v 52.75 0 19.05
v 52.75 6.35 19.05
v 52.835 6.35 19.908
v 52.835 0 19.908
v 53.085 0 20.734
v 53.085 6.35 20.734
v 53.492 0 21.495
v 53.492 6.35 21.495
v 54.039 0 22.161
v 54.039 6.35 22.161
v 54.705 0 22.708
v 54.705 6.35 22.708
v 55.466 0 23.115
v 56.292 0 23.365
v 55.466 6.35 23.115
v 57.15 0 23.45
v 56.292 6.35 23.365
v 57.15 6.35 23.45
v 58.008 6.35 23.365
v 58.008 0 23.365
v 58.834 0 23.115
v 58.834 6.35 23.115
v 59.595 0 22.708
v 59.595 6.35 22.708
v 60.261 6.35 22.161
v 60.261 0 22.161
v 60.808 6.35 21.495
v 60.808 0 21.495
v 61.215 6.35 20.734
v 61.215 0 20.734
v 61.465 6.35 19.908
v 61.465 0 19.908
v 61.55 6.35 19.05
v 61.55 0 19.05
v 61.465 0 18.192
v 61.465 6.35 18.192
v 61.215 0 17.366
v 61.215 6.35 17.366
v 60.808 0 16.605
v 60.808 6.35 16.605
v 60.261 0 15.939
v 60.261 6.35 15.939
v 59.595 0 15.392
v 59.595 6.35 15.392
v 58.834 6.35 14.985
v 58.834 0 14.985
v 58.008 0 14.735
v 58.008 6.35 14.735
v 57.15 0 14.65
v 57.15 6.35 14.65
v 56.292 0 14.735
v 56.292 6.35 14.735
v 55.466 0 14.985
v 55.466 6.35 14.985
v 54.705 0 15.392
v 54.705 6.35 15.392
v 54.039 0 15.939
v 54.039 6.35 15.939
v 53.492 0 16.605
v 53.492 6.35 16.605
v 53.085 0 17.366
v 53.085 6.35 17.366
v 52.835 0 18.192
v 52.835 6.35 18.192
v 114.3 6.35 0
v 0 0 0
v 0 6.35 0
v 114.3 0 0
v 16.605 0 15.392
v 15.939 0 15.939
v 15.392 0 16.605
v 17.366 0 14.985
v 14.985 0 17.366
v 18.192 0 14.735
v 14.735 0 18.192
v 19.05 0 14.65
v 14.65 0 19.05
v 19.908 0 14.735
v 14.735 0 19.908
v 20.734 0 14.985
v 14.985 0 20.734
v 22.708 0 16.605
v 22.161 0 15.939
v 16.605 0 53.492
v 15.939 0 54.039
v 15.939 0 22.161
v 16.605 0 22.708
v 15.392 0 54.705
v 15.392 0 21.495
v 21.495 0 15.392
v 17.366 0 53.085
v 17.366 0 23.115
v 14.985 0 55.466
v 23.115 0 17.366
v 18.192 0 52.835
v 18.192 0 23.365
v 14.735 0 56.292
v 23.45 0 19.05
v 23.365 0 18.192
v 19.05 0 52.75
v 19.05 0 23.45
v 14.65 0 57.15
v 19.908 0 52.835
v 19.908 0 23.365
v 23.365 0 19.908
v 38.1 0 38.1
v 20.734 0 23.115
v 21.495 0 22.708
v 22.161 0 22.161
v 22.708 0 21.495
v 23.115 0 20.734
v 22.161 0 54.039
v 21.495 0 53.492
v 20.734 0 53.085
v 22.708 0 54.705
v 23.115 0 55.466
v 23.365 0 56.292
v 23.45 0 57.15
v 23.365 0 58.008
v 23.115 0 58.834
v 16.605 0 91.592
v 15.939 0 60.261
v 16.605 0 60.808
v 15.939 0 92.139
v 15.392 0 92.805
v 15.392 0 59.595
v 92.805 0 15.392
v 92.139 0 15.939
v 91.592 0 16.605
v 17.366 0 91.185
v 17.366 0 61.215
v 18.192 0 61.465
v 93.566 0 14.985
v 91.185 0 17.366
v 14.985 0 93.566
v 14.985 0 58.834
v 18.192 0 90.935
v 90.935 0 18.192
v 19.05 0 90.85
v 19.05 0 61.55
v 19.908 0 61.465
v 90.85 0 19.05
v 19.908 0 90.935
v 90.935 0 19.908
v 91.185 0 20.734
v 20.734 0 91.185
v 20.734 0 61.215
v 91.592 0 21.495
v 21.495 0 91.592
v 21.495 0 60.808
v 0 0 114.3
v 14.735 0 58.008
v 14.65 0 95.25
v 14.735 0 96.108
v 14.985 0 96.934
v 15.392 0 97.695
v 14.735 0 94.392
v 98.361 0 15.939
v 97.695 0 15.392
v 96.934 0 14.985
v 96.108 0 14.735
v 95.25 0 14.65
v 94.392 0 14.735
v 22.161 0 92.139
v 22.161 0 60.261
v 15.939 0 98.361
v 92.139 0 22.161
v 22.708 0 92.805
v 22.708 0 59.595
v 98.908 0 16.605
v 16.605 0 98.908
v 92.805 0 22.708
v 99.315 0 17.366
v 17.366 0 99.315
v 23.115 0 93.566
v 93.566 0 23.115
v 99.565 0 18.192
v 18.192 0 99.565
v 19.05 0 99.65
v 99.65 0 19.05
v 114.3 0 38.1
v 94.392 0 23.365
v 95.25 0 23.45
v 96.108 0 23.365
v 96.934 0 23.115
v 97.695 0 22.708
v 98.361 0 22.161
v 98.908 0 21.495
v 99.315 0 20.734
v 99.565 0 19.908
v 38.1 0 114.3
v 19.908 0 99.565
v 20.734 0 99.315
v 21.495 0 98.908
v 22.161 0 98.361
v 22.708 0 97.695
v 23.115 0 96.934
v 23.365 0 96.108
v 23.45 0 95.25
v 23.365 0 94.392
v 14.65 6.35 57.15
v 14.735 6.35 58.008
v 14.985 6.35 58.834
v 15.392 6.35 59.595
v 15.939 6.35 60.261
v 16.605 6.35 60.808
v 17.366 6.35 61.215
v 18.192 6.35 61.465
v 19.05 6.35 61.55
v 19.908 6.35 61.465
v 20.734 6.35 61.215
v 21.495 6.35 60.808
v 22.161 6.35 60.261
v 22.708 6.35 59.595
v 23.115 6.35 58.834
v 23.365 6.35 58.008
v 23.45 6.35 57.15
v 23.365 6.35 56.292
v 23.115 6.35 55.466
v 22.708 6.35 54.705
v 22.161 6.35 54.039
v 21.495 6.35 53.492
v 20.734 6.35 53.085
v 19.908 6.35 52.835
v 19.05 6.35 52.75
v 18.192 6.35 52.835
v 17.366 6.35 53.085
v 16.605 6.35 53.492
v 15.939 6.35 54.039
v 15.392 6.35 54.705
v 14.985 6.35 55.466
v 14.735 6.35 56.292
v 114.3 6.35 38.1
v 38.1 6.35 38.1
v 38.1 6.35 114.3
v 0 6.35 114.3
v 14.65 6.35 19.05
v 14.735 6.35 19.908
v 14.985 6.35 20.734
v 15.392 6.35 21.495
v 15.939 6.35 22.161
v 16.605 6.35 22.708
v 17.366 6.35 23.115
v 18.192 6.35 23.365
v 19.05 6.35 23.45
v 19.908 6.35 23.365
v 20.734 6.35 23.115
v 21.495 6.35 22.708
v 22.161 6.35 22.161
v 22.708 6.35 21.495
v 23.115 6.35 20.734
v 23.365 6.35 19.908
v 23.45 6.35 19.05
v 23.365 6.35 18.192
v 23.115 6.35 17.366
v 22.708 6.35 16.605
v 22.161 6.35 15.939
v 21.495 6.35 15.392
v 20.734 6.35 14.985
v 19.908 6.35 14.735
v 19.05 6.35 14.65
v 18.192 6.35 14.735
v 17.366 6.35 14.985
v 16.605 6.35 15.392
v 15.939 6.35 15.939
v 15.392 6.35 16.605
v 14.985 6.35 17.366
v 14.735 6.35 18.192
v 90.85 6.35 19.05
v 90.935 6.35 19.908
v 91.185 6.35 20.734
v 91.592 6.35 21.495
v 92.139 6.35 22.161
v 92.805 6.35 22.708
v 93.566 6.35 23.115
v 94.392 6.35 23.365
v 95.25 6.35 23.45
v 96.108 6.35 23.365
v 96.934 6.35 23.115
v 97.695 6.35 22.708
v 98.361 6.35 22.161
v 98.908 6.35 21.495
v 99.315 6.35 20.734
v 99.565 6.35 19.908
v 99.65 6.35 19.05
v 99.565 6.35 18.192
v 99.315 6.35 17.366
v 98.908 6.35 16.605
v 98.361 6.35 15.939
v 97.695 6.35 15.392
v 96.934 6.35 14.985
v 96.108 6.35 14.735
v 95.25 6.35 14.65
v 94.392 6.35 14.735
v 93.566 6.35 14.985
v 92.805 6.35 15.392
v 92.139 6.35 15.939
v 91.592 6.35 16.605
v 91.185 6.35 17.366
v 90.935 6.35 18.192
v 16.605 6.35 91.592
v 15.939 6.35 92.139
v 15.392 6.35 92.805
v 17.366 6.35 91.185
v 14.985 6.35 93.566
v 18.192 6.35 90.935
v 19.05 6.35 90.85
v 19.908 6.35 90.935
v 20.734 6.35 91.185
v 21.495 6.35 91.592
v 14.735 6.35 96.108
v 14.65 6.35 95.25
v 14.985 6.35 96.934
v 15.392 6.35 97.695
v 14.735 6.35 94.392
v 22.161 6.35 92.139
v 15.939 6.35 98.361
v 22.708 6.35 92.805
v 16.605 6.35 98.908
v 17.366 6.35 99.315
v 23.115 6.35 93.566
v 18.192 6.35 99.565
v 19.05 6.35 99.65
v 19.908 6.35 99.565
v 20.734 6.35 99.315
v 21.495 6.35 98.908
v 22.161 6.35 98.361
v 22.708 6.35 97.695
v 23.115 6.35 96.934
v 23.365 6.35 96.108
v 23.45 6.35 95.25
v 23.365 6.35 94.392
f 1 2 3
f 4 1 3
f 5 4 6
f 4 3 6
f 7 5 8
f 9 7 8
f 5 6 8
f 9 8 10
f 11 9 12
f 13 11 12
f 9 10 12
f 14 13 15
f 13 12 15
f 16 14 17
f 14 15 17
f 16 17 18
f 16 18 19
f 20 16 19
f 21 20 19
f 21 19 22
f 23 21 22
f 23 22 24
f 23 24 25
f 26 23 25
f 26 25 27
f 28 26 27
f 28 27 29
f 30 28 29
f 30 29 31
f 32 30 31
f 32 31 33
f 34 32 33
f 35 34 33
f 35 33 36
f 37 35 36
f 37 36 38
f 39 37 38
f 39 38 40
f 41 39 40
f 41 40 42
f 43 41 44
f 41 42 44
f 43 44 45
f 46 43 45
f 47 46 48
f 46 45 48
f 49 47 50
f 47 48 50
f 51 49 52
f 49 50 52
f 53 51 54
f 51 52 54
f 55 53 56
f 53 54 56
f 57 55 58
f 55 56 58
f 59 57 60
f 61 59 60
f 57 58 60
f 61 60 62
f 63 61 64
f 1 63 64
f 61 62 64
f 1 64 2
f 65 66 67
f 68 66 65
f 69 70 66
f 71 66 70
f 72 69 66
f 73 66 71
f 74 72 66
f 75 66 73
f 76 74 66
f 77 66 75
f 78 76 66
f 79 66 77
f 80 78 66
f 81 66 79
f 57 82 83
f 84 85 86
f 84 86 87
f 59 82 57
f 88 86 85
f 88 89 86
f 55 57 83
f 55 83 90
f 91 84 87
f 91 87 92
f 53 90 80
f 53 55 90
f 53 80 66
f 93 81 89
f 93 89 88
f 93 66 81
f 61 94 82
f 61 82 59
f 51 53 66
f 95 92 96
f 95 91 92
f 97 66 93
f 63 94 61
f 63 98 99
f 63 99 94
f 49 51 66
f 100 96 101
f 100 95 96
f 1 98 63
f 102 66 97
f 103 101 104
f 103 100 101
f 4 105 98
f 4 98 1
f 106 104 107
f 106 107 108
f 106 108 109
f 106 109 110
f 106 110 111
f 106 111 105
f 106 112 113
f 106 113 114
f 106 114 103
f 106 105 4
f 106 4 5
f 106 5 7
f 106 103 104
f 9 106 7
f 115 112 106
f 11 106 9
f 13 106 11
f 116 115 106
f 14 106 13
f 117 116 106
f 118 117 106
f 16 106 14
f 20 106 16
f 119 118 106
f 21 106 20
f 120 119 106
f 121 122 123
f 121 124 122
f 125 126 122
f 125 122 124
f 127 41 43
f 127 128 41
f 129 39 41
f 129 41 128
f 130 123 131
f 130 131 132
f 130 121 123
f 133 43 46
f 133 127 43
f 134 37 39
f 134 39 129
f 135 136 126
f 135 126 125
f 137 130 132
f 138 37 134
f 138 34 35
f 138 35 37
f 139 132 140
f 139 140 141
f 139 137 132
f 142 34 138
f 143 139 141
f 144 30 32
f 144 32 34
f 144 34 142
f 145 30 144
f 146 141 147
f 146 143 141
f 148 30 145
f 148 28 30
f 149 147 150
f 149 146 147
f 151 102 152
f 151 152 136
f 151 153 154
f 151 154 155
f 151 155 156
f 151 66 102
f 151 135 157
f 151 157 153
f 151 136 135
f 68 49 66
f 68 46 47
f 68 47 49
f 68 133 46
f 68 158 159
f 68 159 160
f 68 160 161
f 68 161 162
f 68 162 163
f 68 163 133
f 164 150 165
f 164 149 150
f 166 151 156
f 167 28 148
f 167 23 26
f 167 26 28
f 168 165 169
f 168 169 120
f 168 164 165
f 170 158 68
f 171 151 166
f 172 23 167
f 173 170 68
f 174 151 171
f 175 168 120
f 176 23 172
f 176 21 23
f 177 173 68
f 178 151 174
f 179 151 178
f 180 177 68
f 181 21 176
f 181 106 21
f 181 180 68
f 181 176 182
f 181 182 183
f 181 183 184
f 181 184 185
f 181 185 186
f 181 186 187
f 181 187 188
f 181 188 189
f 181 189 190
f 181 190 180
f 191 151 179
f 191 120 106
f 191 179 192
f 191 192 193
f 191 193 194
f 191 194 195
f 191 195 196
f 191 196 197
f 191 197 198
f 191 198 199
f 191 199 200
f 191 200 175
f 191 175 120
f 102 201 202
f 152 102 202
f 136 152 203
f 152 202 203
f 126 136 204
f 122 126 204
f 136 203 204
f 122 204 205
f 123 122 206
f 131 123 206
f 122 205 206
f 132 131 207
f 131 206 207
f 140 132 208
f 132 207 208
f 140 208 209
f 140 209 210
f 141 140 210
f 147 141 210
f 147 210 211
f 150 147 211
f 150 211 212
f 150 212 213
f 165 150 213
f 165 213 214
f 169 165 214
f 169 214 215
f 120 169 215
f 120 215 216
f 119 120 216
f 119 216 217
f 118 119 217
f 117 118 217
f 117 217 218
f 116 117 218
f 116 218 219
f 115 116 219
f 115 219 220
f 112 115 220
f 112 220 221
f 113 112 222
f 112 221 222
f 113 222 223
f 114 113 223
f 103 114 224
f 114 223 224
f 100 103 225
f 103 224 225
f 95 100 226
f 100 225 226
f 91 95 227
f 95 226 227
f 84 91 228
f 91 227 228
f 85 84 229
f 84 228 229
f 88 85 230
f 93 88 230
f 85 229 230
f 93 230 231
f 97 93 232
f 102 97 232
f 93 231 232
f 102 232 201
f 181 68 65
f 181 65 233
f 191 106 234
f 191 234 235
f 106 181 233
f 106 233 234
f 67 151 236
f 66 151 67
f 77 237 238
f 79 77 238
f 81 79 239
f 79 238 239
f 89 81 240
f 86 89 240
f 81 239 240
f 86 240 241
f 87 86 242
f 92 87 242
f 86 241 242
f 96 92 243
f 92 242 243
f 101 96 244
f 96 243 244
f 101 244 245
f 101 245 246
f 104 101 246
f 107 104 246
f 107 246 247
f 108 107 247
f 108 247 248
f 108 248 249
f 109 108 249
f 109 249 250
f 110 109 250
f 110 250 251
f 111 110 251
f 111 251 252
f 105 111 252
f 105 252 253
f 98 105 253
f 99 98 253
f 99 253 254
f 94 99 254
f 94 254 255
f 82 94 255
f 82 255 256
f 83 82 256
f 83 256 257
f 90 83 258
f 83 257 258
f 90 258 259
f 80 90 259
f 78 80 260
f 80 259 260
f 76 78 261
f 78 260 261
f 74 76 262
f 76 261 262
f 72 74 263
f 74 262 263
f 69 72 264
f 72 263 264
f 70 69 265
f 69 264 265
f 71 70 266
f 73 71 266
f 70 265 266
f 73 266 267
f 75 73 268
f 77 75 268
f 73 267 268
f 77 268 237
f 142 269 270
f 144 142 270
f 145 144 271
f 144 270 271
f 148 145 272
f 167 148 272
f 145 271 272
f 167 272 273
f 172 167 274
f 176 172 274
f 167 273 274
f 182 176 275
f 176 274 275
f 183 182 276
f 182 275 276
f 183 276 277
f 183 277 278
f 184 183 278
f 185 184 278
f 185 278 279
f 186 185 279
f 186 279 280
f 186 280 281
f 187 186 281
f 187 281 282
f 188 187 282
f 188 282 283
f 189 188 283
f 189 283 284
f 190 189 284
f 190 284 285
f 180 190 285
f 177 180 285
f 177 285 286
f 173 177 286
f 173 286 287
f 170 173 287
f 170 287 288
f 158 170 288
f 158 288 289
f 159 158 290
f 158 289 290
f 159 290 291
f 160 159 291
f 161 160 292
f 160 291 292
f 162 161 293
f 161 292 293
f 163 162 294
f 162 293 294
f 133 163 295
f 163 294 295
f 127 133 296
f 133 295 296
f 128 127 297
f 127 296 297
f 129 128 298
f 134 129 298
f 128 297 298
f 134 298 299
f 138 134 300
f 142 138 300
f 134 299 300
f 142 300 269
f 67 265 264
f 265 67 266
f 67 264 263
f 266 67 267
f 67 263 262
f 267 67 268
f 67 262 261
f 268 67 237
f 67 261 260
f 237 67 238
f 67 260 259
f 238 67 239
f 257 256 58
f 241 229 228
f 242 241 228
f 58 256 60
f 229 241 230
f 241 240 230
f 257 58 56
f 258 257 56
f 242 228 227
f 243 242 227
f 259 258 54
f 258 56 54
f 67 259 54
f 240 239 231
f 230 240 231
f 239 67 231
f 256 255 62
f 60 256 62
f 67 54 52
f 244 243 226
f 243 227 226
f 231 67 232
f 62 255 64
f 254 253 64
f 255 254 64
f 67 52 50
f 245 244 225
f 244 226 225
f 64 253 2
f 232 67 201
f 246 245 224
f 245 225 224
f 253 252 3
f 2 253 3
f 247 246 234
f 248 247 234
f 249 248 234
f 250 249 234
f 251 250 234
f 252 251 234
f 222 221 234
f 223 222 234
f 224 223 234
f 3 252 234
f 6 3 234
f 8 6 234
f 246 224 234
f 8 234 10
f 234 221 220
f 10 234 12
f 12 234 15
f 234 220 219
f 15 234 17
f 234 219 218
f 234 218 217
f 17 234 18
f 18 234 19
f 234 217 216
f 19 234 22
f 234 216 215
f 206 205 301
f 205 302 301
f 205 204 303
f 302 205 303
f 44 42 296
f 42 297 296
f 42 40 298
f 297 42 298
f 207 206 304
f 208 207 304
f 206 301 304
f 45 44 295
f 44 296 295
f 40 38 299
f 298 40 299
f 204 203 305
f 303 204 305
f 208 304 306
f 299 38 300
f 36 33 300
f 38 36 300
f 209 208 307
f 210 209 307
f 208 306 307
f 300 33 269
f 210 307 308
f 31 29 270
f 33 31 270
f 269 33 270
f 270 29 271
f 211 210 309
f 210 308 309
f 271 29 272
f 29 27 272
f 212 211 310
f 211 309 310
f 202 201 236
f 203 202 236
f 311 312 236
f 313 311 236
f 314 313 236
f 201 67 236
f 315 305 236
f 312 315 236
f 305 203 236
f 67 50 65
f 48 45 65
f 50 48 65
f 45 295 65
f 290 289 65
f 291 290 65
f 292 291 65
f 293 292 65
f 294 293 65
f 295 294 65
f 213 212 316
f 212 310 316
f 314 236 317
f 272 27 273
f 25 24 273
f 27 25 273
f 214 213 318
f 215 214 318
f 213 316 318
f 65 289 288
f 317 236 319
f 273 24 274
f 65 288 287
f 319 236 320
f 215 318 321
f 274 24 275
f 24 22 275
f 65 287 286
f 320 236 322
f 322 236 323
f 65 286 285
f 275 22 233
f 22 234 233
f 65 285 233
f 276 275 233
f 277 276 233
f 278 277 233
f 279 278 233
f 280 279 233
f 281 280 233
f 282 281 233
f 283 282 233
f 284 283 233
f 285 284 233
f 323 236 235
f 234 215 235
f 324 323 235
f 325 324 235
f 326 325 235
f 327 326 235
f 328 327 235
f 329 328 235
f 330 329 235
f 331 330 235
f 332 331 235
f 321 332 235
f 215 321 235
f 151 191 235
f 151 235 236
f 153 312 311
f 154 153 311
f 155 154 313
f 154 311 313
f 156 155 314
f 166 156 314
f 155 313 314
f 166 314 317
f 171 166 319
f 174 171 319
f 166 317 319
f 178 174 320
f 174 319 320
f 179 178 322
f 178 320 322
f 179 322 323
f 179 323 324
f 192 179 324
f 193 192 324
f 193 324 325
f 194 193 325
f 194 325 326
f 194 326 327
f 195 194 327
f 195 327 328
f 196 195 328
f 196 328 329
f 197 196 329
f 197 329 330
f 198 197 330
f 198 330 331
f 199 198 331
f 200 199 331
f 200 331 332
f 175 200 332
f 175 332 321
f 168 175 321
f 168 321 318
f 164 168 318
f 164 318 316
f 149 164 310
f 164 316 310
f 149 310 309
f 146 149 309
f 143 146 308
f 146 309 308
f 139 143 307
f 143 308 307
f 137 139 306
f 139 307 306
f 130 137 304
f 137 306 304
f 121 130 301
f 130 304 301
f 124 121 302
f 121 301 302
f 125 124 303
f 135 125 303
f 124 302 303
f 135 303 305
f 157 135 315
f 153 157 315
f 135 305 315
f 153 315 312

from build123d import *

# Parameters (mm, degrees)
F1_DEPTH = 6.35
F2_D     = 8.8


# Not quite as in the source:
# - a length typed as a fraction of an inch, garbled in the dataset ("3 / 203.2 mm" for 3/8 in), is restored


with BuildPart() as f1:
    # F0 (on Front) → F1 (new body)
    with BuildSketch(Plane.XZ):
        Polygon((0, 114.3), (0, 0), (114.3, 0), (114.3, 38.1), (38.1, 38.1), (38.1, 114.3), align=None)
    extrude(amount=-F1_DEPTH)

    # F2 (through all)
    with Locations(Plane.XZ):
        with Locations((19.05, 95.25), (19.05, 57.15), (19.05, 19.05), (57.15, 19.05), (95.25, 19.05)):
            Hole(F2_D / 2)


solid = f1.part
